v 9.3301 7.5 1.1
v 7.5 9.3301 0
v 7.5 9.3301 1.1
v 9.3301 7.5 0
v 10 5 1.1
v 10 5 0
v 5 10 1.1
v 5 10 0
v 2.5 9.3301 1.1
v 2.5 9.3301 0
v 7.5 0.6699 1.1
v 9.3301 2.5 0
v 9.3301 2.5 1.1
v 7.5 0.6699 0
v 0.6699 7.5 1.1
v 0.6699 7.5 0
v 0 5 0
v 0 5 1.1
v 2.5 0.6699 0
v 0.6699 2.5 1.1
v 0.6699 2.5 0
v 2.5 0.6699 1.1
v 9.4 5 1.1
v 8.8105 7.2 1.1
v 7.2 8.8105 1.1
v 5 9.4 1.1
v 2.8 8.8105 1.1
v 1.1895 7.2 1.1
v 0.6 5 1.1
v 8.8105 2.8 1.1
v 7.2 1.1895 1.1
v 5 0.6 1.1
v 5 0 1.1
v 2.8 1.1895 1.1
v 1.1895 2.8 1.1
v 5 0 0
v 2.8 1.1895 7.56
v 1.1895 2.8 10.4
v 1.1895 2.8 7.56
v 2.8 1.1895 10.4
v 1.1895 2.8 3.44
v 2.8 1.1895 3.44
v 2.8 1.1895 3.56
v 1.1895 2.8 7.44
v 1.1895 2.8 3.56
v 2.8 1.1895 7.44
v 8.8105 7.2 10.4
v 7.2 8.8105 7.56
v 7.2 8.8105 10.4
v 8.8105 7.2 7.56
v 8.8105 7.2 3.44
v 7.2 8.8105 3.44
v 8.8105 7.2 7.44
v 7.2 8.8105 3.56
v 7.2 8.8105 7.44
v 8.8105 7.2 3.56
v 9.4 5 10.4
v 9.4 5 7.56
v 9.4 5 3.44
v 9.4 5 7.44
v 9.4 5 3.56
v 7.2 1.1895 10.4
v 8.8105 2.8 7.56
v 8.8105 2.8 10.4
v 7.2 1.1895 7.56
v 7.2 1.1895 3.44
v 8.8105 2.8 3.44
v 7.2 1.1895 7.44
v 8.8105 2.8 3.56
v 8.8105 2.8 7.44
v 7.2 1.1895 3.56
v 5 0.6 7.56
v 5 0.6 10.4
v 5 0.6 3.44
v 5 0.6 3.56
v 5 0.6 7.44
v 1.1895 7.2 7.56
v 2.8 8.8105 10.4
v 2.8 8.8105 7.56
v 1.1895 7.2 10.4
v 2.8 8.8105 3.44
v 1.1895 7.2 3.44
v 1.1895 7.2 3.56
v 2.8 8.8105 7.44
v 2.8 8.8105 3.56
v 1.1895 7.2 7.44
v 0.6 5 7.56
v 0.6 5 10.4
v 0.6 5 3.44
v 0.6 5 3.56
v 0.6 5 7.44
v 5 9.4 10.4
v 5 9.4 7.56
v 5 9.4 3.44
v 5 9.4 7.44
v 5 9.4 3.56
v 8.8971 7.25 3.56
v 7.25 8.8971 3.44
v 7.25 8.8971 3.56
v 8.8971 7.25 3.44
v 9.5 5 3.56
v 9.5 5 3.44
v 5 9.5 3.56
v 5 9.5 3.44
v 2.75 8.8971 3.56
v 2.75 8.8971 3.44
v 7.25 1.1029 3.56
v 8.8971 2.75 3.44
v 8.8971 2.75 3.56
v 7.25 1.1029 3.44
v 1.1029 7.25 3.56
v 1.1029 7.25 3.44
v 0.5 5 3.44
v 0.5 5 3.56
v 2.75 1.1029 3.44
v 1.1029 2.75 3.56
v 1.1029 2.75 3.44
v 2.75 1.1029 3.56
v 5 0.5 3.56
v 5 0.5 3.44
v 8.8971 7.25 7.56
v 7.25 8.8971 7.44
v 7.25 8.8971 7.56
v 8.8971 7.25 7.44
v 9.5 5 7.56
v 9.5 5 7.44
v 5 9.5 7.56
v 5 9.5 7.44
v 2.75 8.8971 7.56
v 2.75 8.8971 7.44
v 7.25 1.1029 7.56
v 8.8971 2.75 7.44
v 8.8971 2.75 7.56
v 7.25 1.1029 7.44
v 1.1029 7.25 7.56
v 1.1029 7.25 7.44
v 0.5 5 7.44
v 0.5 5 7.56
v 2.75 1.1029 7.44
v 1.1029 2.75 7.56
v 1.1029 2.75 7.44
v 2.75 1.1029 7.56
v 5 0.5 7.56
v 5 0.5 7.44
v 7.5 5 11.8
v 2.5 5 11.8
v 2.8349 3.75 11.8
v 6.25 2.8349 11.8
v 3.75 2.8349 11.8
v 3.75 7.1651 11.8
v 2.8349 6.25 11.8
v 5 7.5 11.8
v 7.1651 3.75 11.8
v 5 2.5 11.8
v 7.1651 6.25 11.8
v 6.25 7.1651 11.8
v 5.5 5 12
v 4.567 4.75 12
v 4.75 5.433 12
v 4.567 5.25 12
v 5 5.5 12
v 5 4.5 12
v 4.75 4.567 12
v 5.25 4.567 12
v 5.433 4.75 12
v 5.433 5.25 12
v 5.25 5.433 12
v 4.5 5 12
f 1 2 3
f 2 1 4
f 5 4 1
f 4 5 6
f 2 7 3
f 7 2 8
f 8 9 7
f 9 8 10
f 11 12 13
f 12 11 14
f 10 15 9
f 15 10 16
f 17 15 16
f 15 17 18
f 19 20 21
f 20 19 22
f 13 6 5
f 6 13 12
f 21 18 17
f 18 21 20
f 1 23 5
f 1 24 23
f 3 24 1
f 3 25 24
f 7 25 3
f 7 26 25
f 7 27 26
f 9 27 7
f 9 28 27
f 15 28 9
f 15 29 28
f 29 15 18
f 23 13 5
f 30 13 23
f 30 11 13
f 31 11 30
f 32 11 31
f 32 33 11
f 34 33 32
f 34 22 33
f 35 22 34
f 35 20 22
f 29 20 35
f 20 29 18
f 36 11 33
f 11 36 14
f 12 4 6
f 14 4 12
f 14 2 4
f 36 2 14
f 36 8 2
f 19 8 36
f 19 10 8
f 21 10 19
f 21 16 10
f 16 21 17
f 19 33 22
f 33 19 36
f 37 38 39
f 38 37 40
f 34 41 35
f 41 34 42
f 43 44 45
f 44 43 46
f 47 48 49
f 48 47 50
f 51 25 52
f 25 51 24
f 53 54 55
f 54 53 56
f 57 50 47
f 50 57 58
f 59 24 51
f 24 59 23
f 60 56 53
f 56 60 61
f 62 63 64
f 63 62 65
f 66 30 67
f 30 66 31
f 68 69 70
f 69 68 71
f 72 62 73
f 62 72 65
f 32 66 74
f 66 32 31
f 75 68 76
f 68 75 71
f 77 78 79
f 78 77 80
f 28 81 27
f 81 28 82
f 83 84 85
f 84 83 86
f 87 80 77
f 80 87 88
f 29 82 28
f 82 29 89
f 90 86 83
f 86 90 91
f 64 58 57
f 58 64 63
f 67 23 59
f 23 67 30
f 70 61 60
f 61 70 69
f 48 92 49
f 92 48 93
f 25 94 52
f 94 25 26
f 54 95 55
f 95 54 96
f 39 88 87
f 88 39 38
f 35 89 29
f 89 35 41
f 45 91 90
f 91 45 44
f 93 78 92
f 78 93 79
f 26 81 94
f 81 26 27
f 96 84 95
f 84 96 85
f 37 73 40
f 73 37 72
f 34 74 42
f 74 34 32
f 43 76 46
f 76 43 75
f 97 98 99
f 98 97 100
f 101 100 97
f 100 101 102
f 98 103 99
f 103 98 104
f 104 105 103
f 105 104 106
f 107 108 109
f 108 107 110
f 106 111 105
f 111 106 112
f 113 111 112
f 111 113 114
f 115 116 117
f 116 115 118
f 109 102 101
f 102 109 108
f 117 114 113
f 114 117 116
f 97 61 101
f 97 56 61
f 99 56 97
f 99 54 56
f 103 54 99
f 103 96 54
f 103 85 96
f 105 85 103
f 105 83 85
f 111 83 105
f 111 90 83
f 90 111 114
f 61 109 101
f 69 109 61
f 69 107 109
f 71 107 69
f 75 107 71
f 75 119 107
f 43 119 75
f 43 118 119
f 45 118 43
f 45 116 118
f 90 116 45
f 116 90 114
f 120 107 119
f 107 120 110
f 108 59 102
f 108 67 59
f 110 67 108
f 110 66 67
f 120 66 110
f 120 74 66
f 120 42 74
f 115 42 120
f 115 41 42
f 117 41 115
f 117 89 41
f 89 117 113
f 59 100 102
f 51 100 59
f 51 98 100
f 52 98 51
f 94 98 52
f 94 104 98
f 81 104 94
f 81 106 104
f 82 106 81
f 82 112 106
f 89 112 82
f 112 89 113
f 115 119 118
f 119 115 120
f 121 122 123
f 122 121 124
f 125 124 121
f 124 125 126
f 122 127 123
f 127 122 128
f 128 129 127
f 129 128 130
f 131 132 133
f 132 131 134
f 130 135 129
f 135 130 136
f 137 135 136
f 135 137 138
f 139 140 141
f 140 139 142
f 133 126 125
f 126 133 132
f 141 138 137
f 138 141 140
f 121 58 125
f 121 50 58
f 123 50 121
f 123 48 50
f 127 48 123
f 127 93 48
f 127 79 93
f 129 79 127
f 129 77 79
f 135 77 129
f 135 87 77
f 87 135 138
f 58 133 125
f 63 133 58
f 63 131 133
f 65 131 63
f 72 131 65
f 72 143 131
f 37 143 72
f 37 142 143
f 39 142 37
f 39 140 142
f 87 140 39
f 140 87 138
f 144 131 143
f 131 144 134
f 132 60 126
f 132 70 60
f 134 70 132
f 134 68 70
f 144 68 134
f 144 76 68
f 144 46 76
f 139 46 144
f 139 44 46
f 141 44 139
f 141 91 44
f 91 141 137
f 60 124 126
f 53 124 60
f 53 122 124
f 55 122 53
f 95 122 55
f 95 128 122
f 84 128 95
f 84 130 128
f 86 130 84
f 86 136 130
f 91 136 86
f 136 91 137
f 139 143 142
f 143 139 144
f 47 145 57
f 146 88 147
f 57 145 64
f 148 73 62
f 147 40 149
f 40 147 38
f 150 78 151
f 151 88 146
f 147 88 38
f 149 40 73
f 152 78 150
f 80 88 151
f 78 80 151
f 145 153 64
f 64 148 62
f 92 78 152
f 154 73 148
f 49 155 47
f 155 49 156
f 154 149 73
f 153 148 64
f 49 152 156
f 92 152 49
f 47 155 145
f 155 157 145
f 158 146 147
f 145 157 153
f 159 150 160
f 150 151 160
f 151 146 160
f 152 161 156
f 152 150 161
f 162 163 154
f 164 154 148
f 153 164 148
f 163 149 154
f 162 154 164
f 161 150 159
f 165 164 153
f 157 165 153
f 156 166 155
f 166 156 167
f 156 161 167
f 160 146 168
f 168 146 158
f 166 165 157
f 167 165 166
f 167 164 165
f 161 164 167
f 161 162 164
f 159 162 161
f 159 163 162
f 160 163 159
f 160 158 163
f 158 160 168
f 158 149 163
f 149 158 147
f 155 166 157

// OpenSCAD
// 立式油罐 (battle_tankv) — 储油区/补给站油罐
// 轴: x=宽(10), y=深(10), z=高(12); 原点在角(0,0,0); 中心 (5,5)
// 底部环墙(r5 撑 bbox) + 圆柱罐体 + 锥顶 + 顶盖
// 碰撞契约: 实心 10×10×10.5 → GLB bbox 必须精确 10×10×12
$fn = 12;

module tank() {
  // 底部环墙 (r=5 → bbox x/y 0-10, z 0-1.1)
  color([0.70, 0.64, 0.54]) translate([5, 5, 0.55]) cylinder(r = 5, h = 1.1, center = true);
  // 罐体 (r4.4, z 1.1-10.4)
  color([0.62, 0.56, 0.47]) translate([5, 5, 5.75]) cylinder(r = 4.4, h = 9.3, center = true);
  // 罐体分节缝 (2 道细环)
  color([0.58, 0.52, 0.44]) translate([5, 5, 3.5]) cylinder(r = 4.5, h = 0.12, center = true);
  color([0.58, 0.52, 0.44]) translate([5, 5, 7.5]) cylinder(r = 4.5, h = 0.12, center = true);
  // 锥顶 (r4.4→2.5, z 10.4-11.8)
  color([0.55, 0.50, 0.42]) translate([5, 5, 11.1]) cylinder(r1 = 4.4, r2 = 2.5, h = 1.4, center = true);
  // 顶盖 (r2.5→0.5, z 11.8-12)
  color([0.50, 0.46, 0.38]) translate([5, 5, 11.9]) cylinder(r1 = 2.5, r2 = 0.5, h = 0.2, center = true);
}

tank();
